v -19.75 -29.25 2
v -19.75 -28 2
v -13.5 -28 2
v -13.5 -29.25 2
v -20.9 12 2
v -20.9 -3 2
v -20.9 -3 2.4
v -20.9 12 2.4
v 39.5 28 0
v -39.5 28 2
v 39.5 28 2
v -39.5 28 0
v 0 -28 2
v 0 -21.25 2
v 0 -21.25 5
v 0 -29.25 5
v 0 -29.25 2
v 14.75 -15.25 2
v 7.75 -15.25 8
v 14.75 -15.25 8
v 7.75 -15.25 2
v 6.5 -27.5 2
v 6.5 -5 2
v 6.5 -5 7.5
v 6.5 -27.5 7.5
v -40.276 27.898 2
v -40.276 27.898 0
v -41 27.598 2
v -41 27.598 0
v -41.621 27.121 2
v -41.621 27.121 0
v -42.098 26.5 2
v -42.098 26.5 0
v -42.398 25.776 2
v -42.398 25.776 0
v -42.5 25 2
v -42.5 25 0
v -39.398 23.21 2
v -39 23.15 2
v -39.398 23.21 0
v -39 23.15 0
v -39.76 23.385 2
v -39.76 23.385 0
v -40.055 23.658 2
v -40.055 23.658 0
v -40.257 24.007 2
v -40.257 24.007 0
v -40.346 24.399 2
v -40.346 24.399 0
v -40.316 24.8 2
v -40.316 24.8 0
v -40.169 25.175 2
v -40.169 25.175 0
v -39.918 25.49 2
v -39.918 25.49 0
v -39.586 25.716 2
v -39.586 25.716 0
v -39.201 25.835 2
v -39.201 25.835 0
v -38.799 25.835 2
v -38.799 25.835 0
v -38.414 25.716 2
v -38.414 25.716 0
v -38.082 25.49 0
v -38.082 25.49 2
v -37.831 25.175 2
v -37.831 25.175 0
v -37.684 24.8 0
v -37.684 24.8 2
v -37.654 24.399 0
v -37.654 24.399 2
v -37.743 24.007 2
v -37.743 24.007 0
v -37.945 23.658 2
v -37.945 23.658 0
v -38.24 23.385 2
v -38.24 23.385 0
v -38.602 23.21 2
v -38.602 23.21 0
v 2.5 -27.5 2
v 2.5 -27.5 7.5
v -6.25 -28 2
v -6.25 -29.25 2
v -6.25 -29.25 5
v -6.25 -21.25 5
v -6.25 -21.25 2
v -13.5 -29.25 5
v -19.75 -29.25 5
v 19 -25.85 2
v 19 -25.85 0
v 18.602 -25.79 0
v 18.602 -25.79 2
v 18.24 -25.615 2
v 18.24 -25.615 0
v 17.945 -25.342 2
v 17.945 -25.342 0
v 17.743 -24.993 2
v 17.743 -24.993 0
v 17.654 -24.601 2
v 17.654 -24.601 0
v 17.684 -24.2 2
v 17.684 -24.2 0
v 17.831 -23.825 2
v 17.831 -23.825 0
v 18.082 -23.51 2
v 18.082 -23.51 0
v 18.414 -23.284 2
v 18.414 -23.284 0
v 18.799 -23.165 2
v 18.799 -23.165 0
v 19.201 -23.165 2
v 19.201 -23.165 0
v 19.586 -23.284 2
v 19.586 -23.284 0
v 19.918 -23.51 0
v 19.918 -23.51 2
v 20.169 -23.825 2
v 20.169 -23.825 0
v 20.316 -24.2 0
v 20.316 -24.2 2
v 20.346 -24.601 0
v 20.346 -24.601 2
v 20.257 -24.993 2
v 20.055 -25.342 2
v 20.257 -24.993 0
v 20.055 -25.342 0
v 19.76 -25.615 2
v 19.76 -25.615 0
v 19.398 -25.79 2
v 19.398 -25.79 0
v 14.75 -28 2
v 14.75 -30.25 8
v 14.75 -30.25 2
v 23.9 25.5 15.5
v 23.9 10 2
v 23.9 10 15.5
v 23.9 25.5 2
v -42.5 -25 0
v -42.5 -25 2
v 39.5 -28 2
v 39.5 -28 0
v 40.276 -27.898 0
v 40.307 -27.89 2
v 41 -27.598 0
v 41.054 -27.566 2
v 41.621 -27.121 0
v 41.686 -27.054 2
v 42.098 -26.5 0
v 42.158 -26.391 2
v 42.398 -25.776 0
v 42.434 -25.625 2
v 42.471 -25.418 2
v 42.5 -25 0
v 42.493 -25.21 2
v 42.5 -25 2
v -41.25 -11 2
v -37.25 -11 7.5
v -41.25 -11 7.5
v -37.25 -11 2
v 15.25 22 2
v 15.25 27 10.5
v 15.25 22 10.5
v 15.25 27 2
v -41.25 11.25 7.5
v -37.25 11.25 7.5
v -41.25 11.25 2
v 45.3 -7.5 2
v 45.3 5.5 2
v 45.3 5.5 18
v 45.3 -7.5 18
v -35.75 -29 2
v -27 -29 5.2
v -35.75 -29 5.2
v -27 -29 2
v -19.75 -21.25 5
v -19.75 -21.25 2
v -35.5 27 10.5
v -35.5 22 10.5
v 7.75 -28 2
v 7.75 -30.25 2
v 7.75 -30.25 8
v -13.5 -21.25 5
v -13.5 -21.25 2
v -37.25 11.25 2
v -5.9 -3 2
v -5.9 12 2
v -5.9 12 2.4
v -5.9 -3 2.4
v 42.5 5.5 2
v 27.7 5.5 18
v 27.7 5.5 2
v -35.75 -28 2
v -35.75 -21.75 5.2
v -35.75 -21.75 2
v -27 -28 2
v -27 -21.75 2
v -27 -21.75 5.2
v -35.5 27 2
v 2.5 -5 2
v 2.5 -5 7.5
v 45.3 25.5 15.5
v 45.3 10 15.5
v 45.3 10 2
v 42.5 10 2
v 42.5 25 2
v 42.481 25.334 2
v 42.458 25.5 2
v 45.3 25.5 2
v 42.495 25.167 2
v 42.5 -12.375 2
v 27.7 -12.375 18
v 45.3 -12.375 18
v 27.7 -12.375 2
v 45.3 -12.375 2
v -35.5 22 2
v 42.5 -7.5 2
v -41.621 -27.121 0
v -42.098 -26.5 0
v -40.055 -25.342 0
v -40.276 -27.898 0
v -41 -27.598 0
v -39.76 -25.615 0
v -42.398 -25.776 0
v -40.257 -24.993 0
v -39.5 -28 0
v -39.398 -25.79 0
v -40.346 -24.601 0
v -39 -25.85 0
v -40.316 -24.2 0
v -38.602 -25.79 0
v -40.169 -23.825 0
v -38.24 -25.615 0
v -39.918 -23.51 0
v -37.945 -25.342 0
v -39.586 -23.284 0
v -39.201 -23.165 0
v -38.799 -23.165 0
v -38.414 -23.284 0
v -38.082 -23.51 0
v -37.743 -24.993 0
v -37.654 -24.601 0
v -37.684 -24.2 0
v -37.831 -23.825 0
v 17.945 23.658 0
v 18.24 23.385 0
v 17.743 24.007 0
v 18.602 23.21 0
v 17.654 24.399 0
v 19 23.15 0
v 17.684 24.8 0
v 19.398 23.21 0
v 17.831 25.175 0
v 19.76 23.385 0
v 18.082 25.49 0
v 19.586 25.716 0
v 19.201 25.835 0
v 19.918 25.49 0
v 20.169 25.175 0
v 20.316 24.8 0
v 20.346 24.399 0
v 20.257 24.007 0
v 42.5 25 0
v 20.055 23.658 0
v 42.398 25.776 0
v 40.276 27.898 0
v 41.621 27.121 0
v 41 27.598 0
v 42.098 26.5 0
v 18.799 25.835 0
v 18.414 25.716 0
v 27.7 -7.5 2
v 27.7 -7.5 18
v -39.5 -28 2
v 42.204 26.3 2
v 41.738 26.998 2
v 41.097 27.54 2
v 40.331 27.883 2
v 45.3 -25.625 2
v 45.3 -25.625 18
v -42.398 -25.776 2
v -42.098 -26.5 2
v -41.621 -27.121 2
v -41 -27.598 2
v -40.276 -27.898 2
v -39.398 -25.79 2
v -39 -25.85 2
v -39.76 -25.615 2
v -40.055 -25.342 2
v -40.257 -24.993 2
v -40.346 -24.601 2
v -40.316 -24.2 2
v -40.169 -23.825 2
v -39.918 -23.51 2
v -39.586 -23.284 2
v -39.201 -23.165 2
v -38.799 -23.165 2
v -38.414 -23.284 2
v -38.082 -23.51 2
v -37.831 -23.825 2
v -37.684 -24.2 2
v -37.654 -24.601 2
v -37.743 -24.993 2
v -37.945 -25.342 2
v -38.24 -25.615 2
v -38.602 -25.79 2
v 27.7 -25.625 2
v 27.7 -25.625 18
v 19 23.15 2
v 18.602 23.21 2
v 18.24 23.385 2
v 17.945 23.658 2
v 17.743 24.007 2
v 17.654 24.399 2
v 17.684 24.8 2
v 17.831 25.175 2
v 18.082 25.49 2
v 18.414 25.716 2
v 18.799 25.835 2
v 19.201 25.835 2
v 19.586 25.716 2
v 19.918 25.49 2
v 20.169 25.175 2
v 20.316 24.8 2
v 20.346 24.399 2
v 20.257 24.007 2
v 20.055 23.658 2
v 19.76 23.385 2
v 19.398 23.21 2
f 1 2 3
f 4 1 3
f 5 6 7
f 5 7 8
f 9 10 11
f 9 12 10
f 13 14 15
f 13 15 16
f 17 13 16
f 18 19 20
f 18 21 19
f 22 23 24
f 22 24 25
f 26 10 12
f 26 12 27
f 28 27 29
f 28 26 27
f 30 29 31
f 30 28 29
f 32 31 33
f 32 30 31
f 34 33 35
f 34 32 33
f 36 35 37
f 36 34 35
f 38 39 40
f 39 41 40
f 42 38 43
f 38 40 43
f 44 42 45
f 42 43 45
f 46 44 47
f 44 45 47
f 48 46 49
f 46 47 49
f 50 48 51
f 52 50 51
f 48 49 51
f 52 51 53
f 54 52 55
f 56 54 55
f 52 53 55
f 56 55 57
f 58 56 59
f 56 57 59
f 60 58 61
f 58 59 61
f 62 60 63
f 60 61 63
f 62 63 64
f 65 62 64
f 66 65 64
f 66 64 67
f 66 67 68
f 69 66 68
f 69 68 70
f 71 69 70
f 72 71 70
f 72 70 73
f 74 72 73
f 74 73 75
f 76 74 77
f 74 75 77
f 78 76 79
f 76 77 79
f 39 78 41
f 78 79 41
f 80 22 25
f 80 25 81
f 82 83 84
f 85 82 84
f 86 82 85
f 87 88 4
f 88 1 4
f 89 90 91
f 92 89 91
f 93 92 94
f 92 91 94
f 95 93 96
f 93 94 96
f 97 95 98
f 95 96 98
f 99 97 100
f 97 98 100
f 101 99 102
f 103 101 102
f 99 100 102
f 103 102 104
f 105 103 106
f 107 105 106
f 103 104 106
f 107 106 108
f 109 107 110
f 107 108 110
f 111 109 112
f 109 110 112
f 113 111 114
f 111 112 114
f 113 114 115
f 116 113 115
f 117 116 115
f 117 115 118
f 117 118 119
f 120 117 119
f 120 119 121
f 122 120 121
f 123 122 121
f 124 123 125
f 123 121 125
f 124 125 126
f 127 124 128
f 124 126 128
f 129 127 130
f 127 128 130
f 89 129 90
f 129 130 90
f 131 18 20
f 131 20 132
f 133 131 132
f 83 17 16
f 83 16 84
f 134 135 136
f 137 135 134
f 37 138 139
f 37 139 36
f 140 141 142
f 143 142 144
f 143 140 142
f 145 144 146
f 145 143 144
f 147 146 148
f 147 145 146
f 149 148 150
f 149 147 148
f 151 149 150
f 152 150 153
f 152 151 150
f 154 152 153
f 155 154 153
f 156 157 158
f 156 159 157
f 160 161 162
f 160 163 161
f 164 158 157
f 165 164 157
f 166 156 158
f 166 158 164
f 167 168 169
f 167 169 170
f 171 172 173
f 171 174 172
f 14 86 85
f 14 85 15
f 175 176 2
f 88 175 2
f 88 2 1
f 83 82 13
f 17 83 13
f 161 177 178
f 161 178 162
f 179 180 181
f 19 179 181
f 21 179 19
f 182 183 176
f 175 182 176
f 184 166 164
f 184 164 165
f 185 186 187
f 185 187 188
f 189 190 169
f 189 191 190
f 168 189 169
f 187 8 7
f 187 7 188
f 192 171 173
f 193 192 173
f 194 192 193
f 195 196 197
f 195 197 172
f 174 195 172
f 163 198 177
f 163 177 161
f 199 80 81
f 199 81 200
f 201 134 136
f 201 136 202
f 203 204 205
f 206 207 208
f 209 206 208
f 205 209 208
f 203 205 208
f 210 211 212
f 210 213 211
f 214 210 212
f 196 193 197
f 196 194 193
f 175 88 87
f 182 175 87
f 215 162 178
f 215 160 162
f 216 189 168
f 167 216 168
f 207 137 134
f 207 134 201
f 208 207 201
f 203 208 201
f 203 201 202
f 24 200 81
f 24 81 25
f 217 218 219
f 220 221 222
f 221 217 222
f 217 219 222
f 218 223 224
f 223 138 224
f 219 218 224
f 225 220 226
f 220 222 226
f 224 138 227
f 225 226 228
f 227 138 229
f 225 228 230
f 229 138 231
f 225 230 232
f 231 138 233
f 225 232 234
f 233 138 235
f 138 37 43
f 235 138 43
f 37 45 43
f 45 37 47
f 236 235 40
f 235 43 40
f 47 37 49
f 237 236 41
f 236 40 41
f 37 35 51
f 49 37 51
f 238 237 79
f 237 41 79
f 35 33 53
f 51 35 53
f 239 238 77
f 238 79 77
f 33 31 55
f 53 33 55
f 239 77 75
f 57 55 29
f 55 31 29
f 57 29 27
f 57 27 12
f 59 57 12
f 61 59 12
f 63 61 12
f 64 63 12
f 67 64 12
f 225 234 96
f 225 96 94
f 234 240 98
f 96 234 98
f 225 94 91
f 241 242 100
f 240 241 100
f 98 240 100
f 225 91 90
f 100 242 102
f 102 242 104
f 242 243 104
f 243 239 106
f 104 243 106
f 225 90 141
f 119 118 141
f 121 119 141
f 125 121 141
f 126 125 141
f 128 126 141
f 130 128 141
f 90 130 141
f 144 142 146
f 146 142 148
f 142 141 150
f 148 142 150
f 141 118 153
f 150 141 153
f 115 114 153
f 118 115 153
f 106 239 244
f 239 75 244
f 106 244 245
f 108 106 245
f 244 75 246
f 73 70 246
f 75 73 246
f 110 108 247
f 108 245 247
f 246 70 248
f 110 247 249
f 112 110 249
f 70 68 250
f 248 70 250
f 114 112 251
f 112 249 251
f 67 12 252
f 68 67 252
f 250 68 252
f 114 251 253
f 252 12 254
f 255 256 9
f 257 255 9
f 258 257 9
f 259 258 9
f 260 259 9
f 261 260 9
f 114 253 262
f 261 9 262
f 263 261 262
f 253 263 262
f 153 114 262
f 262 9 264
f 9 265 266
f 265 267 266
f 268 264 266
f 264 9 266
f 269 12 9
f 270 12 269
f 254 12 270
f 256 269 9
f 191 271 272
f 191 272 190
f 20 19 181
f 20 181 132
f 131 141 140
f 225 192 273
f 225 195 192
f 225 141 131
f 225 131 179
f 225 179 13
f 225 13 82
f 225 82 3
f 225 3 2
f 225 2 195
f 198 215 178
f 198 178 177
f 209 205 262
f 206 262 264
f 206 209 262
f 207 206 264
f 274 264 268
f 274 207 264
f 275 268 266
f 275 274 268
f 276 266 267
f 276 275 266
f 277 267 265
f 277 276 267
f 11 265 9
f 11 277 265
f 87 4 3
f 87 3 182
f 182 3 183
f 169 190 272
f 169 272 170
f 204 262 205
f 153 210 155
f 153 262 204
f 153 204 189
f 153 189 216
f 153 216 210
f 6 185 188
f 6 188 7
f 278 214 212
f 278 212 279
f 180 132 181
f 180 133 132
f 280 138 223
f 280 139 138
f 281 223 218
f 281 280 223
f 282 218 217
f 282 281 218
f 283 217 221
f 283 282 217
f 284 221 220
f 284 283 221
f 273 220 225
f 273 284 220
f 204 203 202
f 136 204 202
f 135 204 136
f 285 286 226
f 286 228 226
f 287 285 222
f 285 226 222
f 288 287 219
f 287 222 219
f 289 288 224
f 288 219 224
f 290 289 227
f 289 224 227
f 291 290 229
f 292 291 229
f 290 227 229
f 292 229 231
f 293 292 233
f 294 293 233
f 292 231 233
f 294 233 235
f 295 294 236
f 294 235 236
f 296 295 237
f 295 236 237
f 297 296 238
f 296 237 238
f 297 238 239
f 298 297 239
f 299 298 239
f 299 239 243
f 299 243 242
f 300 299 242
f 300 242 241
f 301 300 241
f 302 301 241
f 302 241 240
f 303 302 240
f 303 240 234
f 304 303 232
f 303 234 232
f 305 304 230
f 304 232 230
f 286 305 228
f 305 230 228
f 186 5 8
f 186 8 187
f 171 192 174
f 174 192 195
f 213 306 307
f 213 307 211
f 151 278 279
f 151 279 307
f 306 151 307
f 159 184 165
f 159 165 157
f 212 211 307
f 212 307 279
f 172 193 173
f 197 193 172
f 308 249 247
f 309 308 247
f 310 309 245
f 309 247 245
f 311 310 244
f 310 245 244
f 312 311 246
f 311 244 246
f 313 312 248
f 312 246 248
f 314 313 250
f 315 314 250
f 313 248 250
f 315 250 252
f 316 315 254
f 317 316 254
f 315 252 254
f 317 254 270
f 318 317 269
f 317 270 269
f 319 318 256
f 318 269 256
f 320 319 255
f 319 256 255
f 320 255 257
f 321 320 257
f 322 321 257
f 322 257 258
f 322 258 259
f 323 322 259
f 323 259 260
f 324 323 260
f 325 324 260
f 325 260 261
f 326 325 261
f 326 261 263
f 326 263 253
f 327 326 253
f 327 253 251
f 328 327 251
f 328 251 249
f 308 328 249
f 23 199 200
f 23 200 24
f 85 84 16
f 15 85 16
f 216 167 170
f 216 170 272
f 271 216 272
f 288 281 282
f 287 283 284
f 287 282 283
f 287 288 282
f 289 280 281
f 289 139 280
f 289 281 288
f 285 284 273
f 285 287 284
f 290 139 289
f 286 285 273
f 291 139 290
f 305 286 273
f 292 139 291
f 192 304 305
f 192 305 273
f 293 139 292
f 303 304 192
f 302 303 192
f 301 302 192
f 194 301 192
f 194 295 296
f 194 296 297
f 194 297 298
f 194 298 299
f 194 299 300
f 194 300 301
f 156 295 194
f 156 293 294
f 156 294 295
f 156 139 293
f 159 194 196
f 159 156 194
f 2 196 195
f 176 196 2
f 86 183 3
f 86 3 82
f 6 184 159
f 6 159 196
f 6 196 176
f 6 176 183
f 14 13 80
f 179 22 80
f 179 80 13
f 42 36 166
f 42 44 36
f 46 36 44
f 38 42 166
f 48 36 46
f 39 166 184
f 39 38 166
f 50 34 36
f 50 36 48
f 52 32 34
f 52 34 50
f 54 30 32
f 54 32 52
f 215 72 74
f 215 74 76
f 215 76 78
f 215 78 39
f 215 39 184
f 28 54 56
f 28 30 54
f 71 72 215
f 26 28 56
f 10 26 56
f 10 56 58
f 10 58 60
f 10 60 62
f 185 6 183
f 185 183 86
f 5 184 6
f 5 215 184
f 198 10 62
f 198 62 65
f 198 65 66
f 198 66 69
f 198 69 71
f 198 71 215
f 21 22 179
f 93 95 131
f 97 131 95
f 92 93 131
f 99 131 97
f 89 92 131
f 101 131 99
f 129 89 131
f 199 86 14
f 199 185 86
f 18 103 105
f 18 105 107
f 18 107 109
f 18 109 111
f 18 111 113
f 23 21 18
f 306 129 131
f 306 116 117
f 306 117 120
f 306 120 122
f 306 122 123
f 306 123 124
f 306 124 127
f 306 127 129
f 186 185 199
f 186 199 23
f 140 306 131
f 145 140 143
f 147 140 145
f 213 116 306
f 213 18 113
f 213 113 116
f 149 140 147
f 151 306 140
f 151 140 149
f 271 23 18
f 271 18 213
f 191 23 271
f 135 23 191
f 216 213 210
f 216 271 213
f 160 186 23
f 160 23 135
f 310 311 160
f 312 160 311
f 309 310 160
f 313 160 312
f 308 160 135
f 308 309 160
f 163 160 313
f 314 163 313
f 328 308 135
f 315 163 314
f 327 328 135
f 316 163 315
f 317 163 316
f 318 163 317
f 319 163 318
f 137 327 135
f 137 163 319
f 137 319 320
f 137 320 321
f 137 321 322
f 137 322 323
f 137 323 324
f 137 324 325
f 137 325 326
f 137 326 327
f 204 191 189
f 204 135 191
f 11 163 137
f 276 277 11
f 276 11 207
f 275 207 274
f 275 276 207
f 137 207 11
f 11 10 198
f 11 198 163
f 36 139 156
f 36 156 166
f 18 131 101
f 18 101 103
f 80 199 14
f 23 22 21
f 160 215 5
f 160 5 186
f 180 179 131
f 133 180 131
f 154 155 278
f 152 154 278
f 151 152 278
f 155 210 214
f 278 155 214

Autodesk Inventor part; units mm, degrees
ref_plane "YZ Plane" through (0, 0, 0) normal (1, 0, 0) x (0, 1, 0)
ref_plane "XZ Plane" through (0, 0, 0) normal (0, 1, 0) x (-1, 0, 0)
ref_plane "XY Plane" through (0, 0, 0) normal (0, 0, 1) x (1, 0, 0)
sketch "Sketch1" plane through (0, 0, 0) normal (0, 0, 1) x (1, 0, 0)
  line L0 (-42.5, 28) -> (42.5, 28)
  line L1 (42.5, 28) -> (42.5, -28)
  line L2 (42.5, -28) -> (-42.5, -28)
  line L3 (-42.5, -28) -> (-42.5, 28)
  point P0 (0, 0)
  point P1 (0, 28)
  point P2 (-42.5, 0)
  dimension "d0" = 85
  dimension "d1" = 56
extrude "Extrusion1" add sketch "Sketch1" along normal blind 2
fillet "Fillet1" radius 3 4 edges at (42.5, 28, 1) (42.5, -28, 1) (-42.5, -28, 1) (-42.5, 28, 1)
sketch "Sketch2" plane through (0, 0, 2) normal (0, 0, 1) x (1, 0, 0)
  line L0 (39.5, 28) -> (-39.5, 28) projected
  line L1 (-42.5, 25) -> (-42.5, -25) projected
  line L2 (-39.5, -28) -> (39.5, -28) projected
  point P0 (0, 0)
  point P1 (-39, 24.5)
  point P2 (19, 24.5)
  point P3 (-39, -24.5)
  point P4 (19, -24.5)
  dimension "d5" = 3.5
  dimension "d6" = 3.5
  dimension "d7" = 58
  dimension "d8" = 3.5
hole "Hole1" at (-39, 24.5, 2) at (19, 24.5, 2) at (-39, -24.5, 2) at (19, -24.5, 2) direction (0, 0, -1) diameter 2.7 end through all
sketch "Sketch3" plane through (0, 0, 2) normal (0, 0, 1) x (1, 0, 0)
  line L0 (-66.5402, 48.8384) -> (82.1472, 48.8384) construction
  line L1 (82.1472, 48.8384) -> (82.1472, -46.7464) construction
  line L2 (82.1472, -46.7464) -> (-66.5402, -46.7464) construction
  line L3 (-66.5402, -46.7464) -> (-66.5402, 48.8384) construction
  line L4 (27.7, -12.375) -> (45.3, -12.375)
  line L5 (45.3, -12.375) -> (45.3, -25.625)
  line L6 (45.3, -25.625) -> (27.7, -25.625)
  line L7 (27.7, -25.625) -> (27.7, -12.375)
  line L8 (27.7, 5.5) -> (45.3, 5.5)
  line L9 (45.3, 5.5) -> (45.3, -7.5)
  line L10 (45.3, -7.5) -> (27.7, -7.5)
  line L11 (27.7, -7.5) -> (27.7, 5.5)
  line L12 (23.9, 25.5) -> (45.3, 25.5)
  line L13 (45.3, 25.5) -> (45.3, 10)
  line L14 (45.3, 10) -> (23.9, 10)
  line L15 (23.9, 10) -> (23.9, 25.5)
  line L16 (-20.9, 12) -> (-5.9, 12)
  line L17 (-5.9, 12) -> (-5.9, -3)
  line L18 (-5.9, -3) -> (-20.9, -3)
  line L19 (-20.9, -3) -> (-20.9, 12)
  line L20 (-35.75, -21.75) -> (-27, -21.75)
  line L21 (-27, -21.75) -> (-27, -29)
  line L22 (-27, -29) -> (-35.75, -29)
  line L23 (-35.75, -29) -> (-35.75, -21.75)
  line L24 (-13.5, -21.25) -> (-19.75, -21.25)
  line L25 (-19.75, -21.25) -> (-19.75, -29.25)
  line L26 (-19.75, -29.25) -> (-13.5, -29.25)
  line L27 (-13.5, -29.25) -> (-13.5, -21.25)
  line L28 (-6.25, -21.25) -> (0, -21.25)
  line L29 (0, -21.25) -> (0, -29.25)
  line L30 (0, -29.25) -> (-6.25, -29.25)
  line L31 (-6.25, -29.25) -> (-6.25, -21.25)
  line L32 (7.75, -15.25) -> (14.75, -15.25)
  line L33 (14.75, -15.25) -> (14.75, -30.25)
  line L34 (14.75, -30.25) -> (7.75, -30.25)
  line L35 (7.75, -30.25) -> (7.75, -15.25)
  line L36 (2.5, -5) -> (6.5, -5)
  line L37 (6.5, -5) -> (6.5, -27.5)
  line L38 (6.5, -27.5) -> (2.5, -27.5)
  line L39 (2.5, -27.5) -> (2.5, -5)
  line L40 (-37.25, -11) -> (-41.25, -11)
  line L41 (-41.25, -11) -> (-41.25, 11.25)
  line L42 (-41.25, 11.25) -> (-37.25, 11.25)
  line L43 (-37.25, 11.25) -> (-37.25, -11)
  line L44 (-35.5, 27) -> (15.25, 27)
  line L45 (15.25, 27) -> (15.25, 22)
  line L46 (15.25, 22) -> (-35.5, 22)
  line L47 (-35.5, 22) -> (-35.5, 27)
  line L48 (-42.5, 25) -> (-42.5, -25) projected
  line L49 (39.5, 28) -> (-39.5, 28) projected
  line L50 (-39.5, -28) -> (39.5, -28) projected
  line L51 (42.5, -25) -> (42.5, 25) projected
  point P0 (0, 0)
  point P1 (-39.25, 11.25)
  point P2 (45.3, -19)
  point P3 (45.3, -1)
  point P4 (45.3, 17.75)
  dimension "d55" = 7
  dimension "d56" = 50.75
  dimension "d57" = 5
  dimension "d58" = 1
  dimension "d59" = 16.75
  dimension "d60" = 22.25
  dimension "d61" = 4
  dimension "d62" = 1.25
  dimension "d63" = 1
  dimension "d64" = 1.25
  dimension "d65" = 7.25
  dimension "d66" = 8.75
  dimension "d67" = 6.75
  dimension "d68" = 22.75
  dimension "d69" = 6.25
  dimension "d70" = 6.75
  dimension "d71" = 36.25
  dimension "d72" = 6.25
  dimension "d73" = 4
  dimension "d74" = 22.5
  dimension "d75" = 45
  dimension "d76" = 0.5
  dimension "d77" = 7
  dimension "d78" = 2.25
  dimension "d79" = 27.75
  dimension "d80" = 15
  dimension "d81" = 9
  dimension "d82" = 17.6
  dimension "d83" = 13.25
  dimension "d84" = 2.8
  dimension "d85" = 13
  dimension "d86" = 27
  dimension "d87" = 21.4
  dimension "d88" = 15.5
  dimension "d89" = 45.75
  dimension "d90" = 15
  dimension "d91" = 15
  dimension "d92" = 16
  dimension "d93" = 21.6
extrude "Extrusion2" add sketch "Sketch3" along normal blind 5.5 contours L40 L41 L42 L43
extrude "Extrusion3" add sketch "Sketch3" along normal blind 8.5 contours L44 L45 L46 L47
extrude "Extrusion4" add sketch "Sketch3" along normal blind 2.4 contours L16 L17 L18 L19
extrude "Extrusion5" add sketch "Sketch3" along normal blind 3.2 contours L20 L21 L50 L23 | L50 L21 L22 L23
extrude "Extrusion6" add sketch "Sketch3" along normal blind 3 contours L25 L24 L27 L50 | L50 L27 L26 L25
extrude "Extrusion7" add sketch "Sketch3" along normal blind 3 contours L31 L28 L29 L50 | L50 L29 L30 L31
extrude "Extrusion8" add sketch "Sketch3" along normal blind 5.5 contours L36 L37 L38 L39
extrude "Extrusion9" add sketch "Sketch3" along normal blind 6 contours L35 L32 L33 L50 | L50 L33 L34 L35
extrude "Extrusion10" add sketch "Sketch3" along normal blind 16 contours L4 L5 L6 L7
extrude "Extrusion11" add sketch "Sketch3" along normal blind 16 contours L10 L11 L8 L51 | L51 L8 L9 L10
extrude "Extrusion12" add sketch "Sketch3" along normal blind 13.5 contours L14 L15 L12 L13
sketch "Sketch4" plane through (0, 0, 4.4) normal (0, 0, 1) x (1, 0, 0)
  line L0 (-5.9, -3) -> (-5.9, 12) projected
  line L1 (-20.9, 12) -> (-5.9, 12) projected
  line L2 (-5.9, -3) -> (-20.9, -3)
  line L3 (-20.9, -3) -> (-20.9, 12)
  line L4 (-20.9, 12) -> (-5.9, 12)
  line L5 (-5.9, 12) -> (-5.9, -3)
  point P0 (0, 0)
extrude "Extrusion13" cut sketch "Sketch4" against normal blind 2
properties part number "PI 4 B SPACE MODEL"
